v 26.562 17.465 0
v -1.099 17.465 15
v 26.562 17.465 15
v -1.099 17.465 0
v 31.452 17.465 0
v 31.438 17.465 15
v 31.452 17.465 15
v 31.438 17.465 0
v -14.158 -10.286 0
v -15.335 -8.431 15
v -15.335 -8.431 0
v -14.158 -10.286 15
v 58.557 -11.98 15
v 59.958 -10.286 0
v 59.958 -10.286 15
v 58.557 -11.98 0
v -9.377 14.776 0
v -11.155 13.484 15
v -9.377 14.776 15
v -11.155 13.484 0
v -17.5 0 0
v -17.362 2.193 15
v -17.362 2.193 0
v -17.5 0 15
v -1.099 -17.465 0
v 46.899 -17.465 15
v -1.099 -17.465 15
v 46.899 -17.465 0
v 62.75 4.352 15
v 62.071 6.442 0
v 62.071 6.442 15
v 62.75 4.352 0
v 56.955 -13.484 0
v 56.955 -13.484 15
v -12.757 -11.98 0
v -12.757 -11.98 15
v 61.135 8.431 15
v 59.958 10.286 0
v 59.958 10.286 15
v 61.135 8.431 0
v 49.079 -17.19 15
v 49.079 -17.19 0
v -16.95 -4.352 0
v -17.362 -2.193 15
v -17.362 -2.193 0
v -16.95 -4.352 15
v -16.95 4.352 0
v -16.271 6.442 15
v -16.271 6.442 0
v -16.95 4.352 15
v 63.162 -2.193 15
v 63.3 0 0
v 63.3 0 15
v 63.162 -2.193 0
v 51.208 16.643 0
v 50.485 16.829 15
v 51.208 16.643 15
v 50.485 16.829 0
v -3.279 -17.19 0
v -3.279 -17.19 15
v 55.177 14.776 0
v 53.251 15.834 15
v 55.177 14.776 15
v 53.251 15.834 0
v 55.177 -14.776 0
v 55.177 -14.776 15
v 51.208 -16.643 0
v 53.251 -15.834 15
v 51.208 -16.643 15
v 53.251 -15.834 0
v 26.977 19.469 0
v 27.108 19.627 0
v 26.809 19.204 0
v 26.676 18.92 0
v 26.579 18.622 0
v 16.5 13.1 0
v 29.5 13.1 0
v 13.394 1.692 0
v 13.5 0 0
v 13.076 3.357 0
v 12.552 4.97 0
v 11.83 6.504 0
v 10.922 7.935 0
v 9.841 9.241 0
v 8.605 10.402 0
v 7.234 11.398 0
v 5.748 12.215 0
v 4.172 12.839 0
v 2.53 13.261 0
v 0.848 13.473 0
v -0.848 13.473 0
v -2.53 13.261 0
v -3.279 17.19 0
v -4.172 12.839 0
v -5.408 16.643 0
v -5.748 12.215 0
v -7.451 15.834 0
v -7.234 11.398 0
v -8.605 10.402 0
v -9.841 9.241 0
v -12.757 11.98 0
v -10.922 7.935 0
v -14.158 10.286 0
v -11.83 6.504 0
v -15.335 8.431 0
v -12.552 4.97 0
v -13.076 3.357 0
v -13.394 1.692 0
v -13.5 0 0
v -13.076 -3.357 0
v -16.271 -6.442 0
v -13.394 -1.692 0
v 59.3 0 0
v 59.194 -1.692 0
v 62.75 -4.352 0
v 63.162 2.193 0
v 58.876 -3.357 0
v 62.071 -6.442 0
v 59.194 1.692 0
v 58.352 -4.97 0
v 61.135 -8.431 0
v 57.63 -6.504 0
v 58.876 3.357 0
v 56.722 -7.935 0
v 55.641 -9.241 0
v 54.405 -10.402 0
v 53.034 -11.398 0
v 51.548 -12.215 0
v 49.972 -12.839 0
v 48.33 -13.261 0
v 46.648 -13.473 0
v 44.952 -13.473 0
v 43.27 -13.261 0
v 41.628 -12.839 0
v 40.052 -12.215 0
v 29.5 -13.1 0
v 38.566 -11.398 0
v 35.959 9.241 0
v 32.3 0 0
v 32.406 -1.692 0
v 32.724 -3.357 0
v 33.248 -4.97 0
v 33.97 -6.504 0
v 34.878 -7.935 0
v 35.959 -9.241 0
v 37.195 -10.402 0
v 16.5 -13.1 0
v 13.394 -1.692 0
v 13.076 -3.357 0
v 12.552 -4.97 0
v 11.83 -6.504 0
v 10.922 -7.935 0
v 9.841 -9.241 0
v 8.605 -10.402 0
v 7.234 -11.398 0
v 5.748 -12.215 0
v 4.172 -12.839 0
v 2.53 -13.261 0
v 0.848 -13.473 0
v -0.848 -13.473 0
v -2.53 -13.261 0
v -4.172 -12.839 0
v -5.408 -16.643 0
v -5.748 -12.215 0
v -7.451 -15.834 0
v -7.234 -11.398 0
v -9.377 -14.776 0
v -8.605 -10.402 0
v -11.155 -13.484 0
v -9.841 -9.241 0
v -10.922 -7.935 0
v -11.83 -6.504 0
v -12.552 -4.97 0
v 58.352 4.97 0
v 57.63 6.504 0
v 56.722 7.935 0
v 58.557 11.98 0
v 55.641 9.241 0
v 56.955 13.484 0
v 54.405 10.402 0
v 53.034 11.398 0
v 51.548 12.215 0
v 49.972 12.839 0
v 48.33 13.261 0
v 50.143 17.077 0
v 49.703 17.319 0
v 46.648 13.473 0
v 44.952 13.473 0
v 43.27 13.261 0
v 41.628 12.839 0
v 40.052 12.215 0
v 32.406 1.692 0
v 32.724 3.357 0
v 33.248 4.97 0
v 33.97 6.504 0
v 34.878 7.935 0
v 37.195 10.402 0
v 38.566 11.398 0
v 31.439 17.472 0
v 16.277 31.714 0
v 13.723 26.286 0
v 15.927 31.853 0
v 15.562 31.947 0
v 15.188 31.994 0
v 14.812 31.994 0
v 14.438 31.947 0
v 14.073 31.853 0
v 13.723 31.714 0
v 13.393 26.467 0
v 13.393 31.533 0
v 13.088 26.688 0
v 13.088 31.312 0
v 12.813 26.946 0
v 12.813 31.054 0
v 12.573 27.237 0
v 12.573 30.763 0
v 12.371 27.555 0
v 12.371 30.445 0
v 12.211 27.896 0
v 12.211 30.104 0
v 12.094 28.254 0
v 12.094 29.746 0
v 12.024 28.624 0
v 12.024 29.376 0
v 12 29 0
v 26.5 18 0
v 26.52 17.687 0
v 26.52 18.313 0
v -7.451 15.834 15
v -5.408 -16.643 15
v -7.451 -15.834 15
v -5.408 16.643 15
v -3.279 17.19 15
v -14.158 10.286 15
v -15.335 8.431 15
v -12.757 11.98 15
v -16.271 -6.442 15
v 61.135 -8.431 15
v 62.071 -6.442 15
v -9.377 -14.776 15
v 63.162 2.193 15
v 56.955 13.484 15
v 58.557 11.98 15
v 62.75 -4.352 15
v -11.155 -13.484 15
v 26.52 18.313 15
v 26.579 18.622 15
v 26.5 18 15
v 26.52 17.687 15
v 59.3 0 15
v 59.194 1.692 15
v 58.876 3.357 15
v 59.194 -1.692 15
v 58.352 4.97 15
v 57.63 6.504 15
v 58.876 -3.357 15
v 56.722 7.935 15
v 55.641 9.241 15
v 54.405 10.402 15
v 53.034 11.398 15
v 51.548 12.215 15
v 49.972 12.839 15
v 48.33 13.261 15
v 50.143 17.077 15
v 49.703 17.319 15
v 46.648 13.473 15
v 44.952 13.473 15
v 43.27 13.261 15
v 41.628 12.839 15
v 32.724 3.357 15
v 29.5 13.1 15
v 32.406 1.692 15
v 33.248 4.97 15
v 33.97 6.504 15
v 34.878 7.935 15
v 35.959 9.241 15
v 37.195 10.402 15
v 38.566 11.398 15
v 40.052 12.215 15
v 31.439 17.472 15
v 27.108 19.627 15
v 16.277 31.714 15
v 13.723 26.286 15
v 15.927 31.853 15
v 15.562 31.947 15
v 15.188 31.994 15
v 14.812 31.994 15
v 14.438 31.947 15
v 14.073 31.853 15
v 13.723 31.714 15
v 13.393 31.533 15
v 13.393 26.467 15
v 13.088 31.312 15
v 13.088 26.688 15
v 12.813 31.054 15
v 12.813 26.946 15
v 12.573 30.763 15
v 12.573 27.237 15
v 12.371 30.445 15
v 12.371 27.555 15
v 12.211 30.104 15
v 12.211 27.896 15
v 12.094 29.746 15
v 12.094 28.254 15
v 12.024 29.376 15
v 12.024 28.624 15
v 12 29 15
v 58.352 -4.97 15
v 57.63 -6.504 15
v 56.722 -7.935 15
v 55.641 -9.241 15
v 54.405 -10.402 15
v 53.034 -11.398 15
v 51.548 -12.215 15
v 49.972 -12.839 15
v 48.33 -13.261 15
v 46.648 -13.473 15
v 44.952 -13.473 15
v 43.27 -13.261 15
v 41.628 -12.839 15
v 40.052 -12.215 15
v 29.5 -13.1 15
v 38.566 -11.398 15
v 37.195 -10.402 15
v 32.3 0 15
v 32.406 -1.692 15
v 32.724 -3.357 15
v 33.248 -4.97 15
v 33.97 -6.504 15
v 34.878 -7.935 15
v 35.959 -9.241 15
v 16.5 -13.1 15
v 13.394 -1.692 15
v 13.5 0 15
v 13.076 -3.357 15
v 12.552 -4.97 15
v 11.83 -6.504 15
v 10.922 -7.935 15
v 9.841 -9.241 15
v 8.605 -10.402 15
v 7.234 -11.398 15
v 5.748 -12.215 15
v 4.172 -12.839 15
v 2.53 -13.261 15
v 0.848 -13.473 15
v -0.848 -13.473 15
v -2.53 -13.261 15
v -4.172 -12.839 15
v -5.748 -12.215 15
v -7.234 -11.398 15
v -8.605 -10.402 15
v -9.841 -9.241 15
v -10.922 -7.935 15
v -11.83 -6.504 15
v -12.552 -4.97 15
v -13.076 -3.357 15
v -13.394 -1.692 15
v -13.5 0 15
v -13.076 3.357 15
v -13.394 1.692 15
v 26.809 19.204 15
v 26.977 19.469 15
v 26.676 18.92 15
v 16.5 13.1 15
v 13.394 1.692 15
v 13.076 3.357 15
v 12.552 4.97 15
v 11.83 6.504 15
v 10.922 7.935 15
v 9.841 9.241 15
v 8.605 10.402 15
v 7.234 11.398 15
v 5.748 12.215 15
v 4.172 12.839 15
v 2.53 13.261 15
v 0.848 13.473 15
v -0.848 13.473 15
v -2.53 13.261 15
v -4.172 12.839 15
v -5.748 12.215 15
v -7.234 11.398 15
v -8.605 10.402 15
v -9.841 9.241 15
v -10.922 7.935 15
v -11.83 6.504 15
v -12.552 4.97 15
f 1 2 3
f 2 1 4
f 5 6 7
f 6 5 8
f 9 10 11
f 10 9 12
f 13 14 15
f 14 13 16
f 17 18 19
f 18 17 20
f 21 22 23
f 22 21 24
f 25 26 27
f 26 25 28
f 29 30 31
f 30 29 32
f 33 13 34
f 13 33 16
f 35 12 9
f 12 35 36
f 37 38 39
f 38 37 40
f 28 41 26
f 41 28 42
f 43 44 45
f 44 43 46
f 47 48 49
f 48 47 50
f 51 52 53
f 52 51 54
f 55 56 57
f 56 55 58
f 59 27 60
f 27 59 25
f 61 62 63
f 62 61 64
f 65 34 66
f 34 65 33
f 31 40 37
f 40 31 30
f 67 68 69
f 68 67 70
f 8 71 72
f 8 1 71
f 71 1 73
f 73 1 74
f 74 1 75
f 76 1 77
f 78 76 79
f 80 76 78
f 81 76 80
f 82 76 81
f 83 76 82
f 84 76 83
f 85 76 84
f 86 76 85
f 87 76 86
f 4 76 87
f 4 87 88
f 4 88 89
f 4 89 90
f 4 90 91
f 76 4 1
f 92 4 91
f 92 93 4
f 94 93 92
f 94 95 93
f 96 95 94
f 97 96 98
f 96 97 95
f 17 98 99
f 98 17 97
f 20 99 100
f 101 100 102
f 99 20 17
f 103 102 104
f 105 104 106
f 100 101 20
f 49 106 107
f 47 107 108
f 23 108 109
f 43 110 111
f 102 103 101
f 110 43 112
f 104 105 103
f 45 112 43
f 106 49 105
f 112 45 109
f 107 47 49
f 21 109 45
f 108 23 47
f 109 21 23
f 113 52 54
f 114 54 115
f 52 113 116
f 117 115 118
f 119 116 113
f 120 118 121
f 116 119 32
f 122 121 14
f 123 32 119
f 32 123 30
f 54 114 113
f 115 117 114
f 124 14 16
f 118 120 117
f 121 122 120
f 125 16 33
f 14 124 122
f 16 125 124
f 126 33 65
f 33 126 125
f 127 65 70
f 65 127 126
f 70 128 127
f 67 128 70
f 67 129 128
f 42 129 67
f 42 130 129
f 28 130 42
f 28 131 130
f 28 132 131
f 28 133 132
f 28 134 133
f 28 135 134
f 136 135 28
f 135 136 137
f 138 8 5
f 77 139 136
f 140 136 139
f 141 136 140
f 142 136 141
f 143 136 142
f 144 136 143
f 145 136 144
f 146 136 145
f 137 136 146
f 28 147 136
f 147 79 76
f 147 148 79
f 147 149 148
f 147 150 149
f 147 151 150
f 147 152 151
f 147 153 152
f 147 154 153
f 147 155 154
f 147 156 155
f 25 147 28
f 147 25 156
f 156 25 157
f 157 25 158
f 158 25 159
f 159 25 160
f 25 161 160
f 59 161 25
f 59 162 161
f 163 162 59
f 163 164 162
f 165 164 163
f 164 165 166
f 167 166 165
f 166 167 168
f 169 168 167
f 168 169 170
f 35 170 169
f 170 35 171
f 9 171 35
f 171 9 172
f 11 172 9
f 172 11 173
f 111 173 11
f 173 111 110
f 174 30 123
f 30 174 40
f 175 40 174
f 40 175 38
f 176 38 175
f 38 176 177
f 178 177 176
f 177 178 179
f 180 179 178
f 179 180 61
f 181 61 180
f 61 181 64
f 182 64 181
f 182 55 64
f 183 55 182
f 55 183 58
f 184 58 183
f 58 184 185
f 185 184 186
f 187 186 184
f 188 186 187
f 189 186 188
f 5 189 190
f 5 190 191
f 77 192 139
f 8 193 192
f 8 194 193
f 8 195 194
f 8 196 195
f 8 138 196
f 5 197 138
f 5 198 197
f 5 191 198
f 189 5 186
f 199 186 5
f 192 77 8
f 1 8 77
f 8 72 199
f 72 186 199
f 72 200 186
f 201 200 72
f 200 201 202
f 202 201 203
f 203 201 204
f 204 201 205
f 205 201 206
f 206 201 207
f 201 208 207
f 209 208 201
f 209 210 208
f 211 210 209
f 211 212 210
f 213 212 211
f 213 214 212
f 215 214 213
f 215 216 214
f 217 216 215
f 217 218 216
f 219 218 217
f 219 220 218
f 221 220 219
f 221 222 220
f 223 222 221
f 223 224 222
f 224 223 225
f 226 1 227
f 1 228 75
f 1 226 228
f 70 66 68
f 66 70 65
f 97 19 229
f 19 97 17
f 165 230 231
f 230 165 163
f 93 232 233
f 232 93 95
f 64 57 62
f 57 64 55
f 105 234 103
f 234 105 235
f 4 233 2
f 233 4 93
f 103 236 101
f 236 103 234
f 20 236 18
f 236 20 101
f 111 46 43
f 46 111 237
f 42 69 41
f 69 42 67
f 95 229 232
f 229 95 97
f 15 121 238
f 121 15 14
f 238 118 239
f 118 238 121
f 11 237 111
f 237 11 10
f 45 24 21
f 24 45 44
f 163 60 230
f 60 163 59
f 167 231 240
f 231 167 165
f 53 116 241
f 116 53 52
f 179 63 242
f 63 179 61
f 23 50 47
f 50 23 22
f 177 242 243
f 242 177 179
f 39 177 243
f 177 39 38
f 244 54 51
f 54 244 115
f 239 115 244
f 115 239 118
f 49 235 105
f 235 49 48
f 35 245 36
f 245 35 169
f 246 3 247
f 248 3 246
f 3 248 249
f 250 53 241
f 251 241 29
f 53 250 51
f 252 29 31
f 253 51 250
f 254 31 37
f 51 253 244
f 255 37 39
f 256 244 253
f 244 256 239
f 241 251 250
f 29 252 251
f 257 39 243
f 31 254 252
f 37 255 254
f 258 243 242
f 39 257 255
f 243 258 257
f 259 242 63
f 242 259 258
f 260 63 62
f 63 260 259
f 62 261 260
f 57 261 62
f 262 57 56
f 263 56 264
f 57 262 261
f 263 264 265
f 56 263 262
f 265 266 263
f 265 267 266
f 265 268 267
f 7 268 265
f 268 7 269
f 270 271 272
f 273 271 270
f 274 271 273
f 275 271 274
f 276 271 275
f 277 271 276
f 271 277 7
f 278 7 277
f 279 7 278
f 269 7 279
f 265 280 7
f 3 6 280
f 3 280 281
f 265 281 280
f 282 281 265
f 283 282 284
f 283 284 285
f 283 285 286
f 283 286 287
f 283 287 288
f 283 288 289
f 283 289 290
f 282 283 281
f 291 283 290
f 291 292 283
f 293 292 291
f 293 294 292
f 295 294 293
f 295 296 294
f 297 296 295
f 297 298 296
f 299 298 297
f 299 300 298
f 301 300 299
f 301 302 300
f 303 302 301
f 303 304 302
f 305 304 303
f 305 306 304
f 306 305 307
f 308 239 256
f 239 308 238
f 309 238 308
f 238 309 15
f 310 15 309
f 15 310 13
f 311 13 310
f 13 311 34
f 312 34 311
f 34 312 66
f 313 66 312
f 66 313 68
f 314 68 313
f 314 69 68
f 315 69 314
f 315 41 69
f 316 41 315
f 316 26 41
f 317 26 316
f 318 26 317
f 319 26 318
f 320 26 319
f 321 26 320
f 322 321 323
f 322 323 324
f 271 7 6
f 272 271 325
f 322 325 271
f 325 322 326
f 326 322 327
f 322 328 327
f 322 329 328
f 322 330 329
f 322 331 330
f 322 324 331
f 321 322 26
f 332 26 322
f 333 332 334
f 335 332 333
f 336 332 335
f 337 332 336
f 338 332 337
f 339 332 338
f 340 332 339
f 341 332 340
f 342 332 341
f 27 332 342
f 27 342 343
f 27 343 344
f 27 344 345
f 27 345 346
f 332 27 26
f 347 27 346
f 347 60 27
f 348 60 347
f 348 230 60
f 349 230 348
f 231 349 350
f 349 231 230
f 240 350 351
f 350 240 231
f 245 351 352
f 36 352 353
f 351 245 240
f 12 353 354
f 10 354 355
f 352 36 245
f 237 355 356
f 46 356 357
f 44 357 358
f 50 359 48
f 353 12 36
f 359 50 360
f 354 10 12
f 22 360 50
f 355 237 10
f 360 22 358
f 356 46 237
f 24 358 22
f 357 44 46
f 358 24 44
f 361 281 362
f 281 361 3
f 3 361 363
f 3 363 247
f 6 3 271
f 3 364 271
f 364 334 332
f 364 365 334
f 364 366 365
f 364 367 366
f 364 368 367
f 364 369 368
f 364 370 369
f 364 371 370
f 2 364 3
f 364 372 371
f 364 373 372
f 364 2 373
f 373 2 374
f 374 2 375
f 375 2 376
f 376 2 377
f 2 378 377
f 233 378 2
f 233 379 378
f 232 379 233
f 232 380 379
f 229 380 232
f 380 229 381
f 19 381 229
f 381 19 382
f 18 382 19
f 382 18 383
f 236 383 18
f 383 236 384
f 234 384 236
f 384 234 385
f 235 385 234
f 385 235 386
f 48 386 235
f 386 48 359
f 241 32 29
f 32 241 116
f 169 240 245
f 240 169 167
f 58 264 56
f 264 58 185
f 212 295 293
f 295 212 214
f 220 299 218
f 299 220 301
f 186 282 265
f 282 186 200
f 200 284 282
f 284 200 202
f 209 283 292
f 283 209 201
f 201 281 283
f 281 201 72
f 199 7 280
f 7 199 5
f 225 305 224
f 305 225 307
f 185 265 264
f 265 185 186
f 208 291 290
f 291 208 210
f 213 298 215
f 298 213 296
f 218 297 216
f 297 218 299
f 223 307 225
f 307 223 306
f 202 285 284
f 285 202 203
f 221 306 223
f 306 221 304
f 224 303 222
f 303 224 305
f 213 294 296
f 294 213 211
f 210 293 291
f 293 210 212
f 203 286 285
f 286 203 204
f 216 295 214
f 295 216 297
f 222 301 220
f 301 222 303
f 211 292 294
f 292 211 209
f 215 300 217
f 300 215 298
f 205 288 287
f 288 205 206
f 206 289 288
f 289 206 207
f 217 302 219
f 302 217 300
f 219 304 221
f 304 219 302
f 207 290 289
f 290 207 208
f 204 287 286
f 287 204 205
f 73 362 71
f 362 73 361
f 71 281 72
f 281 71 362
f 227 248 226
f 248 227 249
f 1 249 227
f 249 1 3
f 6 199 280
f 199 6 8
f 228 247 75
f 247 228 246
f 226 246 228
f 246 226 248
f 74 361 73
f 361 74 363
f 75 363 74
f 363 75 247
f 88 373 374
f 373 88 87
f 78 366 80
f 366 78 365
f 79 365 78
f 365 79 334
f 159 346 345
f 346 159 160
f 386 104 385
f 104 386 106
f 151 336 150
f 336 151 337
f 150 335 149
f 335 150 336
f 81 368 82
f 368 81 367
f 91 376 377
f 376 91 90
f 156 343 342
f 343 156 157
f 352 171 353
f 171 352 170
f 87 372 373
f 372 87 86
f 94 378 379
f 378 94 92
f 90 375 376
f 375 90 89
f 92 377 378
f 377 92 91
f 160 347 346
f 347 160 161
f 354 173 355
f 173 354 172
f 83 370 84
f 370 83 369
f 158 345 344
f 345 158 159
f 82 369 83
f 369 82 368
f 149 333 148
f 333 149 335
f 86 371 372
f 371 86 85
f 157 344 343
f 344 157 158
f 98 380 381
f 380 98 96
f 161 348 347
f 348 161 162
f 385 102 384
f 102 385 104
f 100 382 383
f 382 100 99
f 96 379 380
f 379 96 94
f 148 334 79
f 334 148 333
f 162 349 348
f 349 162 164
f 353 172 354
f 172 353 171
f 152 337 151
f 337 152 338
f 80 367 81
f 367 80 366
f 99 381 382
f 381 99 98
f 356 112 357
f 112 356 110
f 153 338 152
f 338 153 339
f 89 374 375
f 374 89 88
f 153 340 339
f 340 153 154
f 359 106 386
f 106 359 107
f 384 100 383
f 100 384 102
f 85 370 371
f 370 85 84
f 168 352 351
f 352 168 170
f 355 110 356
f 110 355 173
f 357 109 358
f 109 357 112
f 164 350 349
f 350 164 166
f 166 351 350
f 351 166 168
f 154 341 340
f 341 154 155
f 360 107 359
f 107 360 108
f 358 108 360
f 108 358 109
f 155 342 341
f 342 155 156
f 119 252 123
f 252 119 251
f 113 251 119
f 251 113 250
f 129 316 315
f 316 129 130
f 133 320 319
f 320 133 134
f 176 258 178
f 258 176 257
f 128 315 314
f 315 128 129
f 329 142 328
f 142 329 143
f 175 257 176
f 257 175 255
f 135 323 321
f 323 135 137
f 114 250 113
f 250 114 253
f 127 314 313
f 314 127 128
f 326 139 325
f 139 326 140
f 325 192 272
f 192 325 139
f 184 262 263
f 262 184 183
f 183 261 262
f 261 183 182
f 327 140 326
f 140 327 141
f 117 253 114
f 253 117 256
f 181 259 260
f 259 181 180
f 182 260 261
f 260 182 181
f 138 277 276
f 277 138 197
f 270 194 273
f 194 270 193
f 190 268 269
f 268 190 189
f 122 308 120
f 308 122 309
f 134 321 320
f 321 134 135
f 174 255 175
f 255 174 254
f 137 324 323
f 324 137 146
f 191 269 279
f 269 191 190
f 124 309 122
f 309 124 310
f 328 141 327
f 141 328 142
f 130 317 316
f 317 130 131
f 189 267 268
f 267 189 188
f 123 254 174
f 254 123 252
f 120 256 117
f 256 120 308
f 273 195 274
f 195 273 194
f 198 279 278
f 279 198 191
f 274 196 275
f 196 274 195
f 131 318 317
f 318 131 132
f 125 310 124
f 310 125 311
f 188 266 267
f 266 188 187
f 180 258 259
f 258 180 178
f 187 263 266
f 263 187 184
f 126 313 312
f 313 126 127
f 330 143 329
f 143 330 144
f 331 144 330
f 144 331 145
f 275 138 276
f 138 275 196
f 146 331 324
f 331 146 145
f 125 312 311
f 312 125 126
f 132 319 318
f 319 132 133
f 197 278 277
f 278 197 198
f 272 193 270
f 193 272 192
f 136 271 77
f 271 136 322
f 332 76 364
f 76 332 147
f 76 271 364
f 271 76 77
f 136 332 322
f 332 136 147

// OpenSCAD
$fn=50;
height = 15;

difference() {
	union() {
hull(){
cylinder(height,17.5,17.5);
translate([45.8,0,0]) cylinder(height,17.5,17.5);
}
hull() {
	translate([48,13.7,0])
		cylinder(height, 4, 4);
	translate([15,29,0])
		cylinder(height, 3, 3);
}
translate([29,18,0])
		cylinder(height, 2.5, 2.5);
}


cylinder(height,13.5,13.5);
translate([45.8,0,0]) cylinder(height,13.5,13.5);

translate([16.5,-13.1,0]) cube([13,26.2, height]);
}



/*
translate([-5,0,0]) difference() {
hull(){

translate([45.8,31,0]) cylinder(height,17.5,17.5);
}
translate([45.8,31,0]) cylinder(height,13.5,13.5);
translate([7,5,0]) rotate([0,0,15]) cube([40,40, 40]);
}

*/
